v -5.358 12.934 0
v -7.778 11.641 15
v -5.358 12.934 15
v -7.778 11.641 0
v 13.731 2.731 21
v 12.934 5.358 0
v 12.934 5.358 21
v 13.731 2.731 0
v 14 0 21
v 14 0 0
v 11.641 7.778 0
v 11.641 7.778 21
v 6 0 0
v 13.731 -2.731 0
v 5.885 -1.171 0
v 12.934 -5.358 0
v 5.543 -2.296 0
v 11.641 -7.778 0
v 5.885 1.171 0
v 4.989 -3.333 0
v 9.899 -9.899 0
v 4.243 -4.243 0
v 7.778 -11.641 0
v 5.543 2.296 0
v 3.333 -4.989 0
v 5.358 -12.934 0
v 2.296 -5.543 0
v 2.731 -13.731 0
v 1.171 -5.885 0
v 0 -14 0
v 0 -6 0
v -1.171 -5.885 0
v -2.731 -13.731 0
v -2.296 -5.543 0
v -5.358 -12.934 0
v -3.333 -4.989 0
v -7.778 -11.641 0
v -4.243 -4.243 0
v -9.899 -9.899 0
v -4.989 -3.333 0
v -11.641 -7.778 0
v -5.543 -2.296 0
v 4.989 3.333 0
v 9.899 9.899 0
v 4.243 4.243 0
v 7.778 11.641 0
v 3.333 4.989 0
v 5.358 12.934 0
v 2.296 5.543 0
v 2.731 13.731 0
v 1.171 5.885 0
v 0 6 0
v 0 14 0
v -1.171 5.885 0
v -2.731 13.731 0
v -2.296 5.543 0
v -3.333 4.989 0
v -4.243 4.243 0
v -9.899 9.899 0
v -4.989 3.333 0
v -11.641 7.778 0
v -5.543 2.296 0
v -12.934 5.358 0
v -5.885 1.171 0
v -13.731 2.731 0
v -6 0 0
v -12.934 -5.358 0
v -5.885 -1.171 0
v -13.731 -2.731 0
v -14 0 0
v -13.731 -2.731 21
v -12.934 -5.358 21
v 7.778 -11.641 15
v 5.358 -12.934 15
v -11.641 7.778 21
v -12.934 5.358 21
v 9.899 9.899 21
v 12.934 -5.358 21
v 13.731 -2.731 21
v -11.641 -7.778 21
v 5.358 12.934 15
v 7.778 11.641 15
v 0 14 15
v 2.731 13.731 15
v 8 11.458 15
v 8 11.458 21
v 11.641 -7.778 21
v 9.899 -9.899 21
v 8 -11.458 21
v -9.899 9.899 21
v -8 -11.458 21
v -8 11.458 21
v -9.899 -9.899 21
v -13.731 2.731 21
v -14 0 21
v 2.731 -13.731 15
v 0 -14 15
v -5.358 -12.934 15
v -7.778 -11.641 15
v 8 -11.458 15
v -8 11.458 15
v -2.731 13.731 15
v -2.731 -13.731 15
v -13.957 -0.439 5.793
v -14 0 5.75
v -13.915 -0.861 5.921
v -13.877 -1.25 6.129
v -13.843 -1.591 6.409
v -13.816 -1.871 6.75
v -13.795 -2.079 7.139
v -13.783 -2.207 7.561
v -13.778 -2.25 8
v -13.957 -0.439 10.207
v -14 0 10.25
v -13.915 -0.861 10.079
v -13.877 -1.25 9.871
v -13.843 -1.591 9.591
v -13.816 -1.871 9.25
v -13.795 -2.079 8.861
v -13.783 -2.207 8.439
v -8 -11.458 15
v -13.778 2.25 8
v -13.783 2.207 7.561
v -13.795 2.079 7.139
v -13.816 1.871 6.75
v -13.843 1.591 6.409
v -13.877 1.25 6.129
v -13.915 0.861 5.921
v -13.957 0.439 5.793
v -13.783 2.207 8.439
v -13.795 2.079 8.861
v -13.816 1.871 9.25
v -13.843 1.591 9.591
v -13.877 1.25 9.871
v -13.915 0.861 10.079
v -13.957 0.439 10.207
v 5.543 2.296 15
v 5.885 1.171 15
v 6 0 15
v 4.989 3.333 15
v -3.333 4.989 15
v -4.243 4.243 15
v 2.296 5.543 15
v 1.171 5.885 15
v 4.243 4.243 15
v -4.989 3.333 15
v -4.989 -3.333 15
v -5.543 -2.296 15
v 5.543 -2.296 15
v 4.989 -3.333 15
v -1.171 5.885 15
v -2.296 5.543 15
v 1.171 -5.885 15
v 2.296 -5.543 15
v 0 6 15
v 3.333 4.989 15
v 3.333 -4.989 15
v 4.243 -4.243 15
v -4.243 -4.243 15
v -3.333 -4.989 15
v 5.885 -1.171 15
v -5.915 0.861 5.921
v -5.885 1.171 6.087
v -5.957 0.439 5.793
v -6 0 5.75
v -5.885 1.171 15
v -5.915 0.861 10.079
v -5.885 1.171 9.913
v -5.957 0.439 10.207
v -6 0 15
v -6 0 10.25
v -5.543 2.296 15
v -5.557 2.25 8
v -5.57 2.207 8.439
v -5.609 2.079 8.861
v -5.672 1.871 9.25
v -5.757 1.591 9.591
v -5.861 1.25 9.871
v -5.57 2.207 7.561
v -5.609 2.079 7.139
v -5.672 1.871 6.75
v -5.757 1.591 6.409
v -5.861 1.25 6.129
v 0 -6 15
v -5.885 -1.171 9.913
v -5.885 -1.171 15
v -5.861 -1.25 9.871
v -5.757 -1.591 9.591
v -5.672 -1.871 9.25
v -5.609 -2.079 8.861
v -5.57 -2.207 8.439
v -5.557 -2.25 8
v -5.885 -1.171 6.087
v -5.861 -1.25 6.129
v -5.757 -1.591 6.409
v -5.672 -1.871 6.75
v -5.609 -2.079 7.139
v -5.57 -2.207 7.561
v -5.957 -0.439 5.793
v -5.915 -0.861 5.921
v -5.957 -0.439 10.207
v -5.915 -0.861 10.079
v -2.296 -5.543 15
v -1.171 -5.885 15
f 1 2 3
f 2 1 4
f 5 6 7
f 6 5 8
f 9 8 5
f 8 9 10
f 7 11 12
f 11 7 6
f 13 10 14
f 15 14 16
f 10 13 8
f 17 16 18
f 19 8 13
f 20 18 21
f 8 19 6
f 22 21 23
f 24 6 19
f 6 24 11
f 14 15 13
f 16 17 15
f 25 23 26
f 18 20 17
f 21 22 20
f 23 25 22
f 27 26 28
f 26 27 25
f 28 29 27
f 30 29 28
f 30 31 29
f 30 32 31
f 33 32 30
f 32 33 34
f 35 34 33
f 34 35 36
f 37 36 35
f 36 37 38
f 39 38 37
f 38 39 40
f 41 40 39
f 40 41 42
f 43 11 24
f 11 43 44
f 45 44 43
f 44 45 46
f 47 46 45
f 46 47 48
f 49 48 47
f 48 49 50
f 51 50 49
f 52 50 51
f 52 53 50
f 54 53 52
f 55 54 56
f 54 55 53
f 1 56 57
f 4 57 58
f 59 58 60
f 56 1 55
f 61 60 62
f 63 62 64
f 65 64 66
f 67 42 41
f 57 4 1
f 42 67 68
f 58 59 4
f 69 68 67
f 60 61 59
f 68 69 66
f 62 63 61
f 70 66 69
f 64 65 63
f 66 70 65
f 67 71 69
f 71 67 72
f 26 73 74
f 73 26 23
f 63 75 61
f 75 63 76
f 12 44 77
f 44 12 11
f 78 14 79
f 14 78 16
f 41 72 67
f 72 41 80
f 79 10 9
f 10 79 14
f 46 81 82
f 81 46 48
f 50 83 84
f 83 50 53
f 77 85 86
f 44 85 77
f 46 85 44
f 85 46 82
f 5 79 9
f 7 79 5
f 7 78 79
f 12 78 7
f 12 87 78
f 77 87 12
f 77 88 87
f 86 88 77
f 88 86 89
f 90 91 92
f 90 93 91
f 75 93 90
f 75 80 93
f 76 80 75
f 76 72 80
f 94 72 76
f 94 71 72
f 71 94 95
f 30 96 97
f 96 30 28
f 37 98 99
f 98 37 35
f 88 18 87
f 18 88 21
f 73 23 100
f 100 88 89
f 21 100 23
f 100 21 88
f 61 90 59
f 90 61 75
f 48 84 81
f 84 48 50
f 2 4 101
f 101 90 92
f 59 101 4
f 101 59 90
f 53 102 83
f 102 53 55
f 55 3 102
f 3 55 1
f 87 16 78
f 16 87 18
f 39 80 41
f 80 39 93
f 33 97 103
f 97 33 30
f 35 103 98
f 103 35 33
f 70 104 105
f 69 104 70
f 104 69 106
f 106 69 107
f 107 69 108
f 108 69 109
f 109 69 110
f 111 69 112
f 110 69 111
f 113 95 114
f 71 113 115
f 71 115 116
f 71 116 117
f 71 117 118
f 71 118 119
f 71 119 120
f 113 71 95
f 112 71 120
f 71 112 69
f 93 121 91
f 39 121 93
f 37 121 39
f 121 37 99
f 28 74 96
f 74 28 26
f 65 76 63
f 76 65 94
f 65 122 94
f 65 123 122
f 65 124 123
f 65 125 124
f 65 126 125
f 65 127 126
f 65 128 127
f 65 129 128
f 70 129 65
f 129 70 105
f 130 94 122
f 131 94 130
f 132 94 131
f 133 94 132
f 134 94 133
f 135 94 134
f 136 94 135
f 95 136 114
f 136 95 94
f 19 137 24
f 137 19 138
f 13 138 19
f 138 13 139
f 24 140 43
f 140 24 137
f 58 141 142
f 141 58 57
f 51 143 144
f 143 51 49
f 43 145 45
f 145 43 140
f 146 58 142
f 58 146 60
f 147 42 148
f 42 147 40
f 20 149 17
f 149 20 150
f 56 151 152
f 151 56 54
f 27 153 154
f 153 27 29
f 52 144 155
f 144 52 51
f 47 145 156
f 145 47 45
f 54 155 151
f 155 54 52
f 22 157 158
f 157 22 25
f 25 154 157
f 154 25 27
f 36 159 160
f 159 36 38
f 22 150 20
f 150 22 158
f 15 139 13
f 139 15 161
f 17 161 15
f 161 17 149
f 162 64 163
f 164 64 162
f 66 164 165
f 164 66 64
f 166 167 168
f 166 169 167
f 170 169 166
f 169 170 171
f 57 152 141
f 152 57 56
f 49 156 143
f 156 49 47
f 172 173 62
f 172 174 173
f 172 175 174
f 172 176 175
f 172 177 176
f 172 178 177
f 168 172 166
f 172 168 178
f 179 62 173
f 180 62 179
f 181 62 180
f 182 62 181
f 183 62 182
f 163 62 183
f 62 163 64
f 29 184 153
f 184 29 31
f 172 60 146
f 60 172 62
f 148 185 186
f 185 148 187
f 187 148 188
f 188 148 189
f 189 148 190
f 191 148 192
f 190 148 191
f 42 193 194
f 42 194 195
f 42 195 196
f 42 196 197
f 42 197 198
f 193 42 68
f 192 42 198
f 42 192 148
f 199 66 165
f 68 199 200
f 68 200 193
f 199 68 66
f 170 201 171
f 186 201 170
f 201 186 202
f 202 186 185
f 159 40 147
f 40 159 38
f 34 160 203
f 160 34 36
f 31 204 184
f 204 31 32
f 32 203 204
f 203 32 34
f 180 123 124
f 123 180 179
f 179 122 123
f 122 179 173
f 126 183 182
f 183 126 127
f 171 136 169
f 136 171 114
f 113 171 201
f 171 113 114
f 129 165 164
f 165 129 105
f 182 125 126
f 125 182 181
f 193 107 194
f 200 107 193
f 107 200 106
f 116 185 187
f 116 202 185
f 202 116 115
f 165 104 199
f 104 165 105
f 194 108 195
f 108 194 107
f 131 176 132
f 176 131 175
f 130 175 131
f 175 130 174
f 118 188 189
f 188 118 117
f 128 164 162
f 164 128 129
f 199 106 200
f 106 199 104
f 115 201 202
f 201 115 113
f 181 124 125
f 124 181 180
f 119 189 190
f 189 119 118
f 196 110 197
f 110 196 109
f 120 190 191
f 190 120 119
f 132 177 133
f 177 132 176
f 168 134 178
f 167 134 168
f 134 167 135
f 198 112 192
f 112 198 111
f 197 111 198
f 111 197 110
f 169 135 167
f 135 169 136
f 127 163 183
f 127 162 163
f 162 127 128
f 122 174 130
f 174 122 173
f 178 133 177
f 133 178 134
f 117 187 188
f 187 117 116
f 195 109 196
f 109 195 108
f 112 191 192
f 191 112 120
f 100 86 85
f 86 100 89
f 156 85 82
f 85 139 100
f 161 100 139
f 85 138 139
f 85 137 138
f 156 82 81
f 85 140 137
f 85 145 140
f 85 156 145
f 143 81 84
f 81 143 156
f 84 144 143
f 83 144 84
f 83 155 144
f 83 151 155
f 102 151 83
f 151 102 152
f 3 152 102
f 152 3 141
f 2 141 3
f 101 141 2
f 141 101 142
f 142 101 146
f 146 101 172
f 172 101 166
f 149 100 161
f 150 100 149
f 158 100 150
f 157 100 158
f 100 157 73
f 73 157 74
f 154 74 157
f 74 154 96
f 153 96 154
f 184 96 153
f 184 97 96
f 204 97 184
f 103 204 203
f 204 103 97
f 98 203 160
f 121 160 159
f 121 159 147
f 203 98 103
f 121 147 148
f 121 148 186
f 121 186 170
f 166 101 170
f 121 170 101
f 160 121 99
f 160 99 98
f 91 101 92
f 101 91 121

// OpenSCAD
$fn = 32;

// ----------------------------------------------------------------------
// Oldham coupling hub: 28 x 21 mm
// ----------------------------------------------------------------------

// --- parameters (mm) ---
flange_dia = 28;          // hub diameter
flange_len = 16;          // hub length
hub_bore = 12;            // shaft bore
key_w = 16;               // drive tongue width
tongue_h = 5;             // drive tongue height
set_d = 4.5;              // set screw tap hole

module hub() {
  /* the slot side is a raised disc with a groove milled across it */
  cylinder(h = flange_len + tongue_h, d = flange_dia);
}

difference() {
  hub();
  translate([0, 0, -1]) cylinder(h = flange_len + tongue_h + 2, d = hub_bore);
  translate([-flange_dia / 2 - 1, 0, flange_len * 0.5])
    rotate([0, 90, 0]) cylinder(h = flange_dia / 2 + 2, d = set_d);
  translate([-key_w / 2, -flange_dia / 2 - 1, flange_len - 1])
    cube([key_w, flange_dia + 2, tongue_h + 1]);
}
